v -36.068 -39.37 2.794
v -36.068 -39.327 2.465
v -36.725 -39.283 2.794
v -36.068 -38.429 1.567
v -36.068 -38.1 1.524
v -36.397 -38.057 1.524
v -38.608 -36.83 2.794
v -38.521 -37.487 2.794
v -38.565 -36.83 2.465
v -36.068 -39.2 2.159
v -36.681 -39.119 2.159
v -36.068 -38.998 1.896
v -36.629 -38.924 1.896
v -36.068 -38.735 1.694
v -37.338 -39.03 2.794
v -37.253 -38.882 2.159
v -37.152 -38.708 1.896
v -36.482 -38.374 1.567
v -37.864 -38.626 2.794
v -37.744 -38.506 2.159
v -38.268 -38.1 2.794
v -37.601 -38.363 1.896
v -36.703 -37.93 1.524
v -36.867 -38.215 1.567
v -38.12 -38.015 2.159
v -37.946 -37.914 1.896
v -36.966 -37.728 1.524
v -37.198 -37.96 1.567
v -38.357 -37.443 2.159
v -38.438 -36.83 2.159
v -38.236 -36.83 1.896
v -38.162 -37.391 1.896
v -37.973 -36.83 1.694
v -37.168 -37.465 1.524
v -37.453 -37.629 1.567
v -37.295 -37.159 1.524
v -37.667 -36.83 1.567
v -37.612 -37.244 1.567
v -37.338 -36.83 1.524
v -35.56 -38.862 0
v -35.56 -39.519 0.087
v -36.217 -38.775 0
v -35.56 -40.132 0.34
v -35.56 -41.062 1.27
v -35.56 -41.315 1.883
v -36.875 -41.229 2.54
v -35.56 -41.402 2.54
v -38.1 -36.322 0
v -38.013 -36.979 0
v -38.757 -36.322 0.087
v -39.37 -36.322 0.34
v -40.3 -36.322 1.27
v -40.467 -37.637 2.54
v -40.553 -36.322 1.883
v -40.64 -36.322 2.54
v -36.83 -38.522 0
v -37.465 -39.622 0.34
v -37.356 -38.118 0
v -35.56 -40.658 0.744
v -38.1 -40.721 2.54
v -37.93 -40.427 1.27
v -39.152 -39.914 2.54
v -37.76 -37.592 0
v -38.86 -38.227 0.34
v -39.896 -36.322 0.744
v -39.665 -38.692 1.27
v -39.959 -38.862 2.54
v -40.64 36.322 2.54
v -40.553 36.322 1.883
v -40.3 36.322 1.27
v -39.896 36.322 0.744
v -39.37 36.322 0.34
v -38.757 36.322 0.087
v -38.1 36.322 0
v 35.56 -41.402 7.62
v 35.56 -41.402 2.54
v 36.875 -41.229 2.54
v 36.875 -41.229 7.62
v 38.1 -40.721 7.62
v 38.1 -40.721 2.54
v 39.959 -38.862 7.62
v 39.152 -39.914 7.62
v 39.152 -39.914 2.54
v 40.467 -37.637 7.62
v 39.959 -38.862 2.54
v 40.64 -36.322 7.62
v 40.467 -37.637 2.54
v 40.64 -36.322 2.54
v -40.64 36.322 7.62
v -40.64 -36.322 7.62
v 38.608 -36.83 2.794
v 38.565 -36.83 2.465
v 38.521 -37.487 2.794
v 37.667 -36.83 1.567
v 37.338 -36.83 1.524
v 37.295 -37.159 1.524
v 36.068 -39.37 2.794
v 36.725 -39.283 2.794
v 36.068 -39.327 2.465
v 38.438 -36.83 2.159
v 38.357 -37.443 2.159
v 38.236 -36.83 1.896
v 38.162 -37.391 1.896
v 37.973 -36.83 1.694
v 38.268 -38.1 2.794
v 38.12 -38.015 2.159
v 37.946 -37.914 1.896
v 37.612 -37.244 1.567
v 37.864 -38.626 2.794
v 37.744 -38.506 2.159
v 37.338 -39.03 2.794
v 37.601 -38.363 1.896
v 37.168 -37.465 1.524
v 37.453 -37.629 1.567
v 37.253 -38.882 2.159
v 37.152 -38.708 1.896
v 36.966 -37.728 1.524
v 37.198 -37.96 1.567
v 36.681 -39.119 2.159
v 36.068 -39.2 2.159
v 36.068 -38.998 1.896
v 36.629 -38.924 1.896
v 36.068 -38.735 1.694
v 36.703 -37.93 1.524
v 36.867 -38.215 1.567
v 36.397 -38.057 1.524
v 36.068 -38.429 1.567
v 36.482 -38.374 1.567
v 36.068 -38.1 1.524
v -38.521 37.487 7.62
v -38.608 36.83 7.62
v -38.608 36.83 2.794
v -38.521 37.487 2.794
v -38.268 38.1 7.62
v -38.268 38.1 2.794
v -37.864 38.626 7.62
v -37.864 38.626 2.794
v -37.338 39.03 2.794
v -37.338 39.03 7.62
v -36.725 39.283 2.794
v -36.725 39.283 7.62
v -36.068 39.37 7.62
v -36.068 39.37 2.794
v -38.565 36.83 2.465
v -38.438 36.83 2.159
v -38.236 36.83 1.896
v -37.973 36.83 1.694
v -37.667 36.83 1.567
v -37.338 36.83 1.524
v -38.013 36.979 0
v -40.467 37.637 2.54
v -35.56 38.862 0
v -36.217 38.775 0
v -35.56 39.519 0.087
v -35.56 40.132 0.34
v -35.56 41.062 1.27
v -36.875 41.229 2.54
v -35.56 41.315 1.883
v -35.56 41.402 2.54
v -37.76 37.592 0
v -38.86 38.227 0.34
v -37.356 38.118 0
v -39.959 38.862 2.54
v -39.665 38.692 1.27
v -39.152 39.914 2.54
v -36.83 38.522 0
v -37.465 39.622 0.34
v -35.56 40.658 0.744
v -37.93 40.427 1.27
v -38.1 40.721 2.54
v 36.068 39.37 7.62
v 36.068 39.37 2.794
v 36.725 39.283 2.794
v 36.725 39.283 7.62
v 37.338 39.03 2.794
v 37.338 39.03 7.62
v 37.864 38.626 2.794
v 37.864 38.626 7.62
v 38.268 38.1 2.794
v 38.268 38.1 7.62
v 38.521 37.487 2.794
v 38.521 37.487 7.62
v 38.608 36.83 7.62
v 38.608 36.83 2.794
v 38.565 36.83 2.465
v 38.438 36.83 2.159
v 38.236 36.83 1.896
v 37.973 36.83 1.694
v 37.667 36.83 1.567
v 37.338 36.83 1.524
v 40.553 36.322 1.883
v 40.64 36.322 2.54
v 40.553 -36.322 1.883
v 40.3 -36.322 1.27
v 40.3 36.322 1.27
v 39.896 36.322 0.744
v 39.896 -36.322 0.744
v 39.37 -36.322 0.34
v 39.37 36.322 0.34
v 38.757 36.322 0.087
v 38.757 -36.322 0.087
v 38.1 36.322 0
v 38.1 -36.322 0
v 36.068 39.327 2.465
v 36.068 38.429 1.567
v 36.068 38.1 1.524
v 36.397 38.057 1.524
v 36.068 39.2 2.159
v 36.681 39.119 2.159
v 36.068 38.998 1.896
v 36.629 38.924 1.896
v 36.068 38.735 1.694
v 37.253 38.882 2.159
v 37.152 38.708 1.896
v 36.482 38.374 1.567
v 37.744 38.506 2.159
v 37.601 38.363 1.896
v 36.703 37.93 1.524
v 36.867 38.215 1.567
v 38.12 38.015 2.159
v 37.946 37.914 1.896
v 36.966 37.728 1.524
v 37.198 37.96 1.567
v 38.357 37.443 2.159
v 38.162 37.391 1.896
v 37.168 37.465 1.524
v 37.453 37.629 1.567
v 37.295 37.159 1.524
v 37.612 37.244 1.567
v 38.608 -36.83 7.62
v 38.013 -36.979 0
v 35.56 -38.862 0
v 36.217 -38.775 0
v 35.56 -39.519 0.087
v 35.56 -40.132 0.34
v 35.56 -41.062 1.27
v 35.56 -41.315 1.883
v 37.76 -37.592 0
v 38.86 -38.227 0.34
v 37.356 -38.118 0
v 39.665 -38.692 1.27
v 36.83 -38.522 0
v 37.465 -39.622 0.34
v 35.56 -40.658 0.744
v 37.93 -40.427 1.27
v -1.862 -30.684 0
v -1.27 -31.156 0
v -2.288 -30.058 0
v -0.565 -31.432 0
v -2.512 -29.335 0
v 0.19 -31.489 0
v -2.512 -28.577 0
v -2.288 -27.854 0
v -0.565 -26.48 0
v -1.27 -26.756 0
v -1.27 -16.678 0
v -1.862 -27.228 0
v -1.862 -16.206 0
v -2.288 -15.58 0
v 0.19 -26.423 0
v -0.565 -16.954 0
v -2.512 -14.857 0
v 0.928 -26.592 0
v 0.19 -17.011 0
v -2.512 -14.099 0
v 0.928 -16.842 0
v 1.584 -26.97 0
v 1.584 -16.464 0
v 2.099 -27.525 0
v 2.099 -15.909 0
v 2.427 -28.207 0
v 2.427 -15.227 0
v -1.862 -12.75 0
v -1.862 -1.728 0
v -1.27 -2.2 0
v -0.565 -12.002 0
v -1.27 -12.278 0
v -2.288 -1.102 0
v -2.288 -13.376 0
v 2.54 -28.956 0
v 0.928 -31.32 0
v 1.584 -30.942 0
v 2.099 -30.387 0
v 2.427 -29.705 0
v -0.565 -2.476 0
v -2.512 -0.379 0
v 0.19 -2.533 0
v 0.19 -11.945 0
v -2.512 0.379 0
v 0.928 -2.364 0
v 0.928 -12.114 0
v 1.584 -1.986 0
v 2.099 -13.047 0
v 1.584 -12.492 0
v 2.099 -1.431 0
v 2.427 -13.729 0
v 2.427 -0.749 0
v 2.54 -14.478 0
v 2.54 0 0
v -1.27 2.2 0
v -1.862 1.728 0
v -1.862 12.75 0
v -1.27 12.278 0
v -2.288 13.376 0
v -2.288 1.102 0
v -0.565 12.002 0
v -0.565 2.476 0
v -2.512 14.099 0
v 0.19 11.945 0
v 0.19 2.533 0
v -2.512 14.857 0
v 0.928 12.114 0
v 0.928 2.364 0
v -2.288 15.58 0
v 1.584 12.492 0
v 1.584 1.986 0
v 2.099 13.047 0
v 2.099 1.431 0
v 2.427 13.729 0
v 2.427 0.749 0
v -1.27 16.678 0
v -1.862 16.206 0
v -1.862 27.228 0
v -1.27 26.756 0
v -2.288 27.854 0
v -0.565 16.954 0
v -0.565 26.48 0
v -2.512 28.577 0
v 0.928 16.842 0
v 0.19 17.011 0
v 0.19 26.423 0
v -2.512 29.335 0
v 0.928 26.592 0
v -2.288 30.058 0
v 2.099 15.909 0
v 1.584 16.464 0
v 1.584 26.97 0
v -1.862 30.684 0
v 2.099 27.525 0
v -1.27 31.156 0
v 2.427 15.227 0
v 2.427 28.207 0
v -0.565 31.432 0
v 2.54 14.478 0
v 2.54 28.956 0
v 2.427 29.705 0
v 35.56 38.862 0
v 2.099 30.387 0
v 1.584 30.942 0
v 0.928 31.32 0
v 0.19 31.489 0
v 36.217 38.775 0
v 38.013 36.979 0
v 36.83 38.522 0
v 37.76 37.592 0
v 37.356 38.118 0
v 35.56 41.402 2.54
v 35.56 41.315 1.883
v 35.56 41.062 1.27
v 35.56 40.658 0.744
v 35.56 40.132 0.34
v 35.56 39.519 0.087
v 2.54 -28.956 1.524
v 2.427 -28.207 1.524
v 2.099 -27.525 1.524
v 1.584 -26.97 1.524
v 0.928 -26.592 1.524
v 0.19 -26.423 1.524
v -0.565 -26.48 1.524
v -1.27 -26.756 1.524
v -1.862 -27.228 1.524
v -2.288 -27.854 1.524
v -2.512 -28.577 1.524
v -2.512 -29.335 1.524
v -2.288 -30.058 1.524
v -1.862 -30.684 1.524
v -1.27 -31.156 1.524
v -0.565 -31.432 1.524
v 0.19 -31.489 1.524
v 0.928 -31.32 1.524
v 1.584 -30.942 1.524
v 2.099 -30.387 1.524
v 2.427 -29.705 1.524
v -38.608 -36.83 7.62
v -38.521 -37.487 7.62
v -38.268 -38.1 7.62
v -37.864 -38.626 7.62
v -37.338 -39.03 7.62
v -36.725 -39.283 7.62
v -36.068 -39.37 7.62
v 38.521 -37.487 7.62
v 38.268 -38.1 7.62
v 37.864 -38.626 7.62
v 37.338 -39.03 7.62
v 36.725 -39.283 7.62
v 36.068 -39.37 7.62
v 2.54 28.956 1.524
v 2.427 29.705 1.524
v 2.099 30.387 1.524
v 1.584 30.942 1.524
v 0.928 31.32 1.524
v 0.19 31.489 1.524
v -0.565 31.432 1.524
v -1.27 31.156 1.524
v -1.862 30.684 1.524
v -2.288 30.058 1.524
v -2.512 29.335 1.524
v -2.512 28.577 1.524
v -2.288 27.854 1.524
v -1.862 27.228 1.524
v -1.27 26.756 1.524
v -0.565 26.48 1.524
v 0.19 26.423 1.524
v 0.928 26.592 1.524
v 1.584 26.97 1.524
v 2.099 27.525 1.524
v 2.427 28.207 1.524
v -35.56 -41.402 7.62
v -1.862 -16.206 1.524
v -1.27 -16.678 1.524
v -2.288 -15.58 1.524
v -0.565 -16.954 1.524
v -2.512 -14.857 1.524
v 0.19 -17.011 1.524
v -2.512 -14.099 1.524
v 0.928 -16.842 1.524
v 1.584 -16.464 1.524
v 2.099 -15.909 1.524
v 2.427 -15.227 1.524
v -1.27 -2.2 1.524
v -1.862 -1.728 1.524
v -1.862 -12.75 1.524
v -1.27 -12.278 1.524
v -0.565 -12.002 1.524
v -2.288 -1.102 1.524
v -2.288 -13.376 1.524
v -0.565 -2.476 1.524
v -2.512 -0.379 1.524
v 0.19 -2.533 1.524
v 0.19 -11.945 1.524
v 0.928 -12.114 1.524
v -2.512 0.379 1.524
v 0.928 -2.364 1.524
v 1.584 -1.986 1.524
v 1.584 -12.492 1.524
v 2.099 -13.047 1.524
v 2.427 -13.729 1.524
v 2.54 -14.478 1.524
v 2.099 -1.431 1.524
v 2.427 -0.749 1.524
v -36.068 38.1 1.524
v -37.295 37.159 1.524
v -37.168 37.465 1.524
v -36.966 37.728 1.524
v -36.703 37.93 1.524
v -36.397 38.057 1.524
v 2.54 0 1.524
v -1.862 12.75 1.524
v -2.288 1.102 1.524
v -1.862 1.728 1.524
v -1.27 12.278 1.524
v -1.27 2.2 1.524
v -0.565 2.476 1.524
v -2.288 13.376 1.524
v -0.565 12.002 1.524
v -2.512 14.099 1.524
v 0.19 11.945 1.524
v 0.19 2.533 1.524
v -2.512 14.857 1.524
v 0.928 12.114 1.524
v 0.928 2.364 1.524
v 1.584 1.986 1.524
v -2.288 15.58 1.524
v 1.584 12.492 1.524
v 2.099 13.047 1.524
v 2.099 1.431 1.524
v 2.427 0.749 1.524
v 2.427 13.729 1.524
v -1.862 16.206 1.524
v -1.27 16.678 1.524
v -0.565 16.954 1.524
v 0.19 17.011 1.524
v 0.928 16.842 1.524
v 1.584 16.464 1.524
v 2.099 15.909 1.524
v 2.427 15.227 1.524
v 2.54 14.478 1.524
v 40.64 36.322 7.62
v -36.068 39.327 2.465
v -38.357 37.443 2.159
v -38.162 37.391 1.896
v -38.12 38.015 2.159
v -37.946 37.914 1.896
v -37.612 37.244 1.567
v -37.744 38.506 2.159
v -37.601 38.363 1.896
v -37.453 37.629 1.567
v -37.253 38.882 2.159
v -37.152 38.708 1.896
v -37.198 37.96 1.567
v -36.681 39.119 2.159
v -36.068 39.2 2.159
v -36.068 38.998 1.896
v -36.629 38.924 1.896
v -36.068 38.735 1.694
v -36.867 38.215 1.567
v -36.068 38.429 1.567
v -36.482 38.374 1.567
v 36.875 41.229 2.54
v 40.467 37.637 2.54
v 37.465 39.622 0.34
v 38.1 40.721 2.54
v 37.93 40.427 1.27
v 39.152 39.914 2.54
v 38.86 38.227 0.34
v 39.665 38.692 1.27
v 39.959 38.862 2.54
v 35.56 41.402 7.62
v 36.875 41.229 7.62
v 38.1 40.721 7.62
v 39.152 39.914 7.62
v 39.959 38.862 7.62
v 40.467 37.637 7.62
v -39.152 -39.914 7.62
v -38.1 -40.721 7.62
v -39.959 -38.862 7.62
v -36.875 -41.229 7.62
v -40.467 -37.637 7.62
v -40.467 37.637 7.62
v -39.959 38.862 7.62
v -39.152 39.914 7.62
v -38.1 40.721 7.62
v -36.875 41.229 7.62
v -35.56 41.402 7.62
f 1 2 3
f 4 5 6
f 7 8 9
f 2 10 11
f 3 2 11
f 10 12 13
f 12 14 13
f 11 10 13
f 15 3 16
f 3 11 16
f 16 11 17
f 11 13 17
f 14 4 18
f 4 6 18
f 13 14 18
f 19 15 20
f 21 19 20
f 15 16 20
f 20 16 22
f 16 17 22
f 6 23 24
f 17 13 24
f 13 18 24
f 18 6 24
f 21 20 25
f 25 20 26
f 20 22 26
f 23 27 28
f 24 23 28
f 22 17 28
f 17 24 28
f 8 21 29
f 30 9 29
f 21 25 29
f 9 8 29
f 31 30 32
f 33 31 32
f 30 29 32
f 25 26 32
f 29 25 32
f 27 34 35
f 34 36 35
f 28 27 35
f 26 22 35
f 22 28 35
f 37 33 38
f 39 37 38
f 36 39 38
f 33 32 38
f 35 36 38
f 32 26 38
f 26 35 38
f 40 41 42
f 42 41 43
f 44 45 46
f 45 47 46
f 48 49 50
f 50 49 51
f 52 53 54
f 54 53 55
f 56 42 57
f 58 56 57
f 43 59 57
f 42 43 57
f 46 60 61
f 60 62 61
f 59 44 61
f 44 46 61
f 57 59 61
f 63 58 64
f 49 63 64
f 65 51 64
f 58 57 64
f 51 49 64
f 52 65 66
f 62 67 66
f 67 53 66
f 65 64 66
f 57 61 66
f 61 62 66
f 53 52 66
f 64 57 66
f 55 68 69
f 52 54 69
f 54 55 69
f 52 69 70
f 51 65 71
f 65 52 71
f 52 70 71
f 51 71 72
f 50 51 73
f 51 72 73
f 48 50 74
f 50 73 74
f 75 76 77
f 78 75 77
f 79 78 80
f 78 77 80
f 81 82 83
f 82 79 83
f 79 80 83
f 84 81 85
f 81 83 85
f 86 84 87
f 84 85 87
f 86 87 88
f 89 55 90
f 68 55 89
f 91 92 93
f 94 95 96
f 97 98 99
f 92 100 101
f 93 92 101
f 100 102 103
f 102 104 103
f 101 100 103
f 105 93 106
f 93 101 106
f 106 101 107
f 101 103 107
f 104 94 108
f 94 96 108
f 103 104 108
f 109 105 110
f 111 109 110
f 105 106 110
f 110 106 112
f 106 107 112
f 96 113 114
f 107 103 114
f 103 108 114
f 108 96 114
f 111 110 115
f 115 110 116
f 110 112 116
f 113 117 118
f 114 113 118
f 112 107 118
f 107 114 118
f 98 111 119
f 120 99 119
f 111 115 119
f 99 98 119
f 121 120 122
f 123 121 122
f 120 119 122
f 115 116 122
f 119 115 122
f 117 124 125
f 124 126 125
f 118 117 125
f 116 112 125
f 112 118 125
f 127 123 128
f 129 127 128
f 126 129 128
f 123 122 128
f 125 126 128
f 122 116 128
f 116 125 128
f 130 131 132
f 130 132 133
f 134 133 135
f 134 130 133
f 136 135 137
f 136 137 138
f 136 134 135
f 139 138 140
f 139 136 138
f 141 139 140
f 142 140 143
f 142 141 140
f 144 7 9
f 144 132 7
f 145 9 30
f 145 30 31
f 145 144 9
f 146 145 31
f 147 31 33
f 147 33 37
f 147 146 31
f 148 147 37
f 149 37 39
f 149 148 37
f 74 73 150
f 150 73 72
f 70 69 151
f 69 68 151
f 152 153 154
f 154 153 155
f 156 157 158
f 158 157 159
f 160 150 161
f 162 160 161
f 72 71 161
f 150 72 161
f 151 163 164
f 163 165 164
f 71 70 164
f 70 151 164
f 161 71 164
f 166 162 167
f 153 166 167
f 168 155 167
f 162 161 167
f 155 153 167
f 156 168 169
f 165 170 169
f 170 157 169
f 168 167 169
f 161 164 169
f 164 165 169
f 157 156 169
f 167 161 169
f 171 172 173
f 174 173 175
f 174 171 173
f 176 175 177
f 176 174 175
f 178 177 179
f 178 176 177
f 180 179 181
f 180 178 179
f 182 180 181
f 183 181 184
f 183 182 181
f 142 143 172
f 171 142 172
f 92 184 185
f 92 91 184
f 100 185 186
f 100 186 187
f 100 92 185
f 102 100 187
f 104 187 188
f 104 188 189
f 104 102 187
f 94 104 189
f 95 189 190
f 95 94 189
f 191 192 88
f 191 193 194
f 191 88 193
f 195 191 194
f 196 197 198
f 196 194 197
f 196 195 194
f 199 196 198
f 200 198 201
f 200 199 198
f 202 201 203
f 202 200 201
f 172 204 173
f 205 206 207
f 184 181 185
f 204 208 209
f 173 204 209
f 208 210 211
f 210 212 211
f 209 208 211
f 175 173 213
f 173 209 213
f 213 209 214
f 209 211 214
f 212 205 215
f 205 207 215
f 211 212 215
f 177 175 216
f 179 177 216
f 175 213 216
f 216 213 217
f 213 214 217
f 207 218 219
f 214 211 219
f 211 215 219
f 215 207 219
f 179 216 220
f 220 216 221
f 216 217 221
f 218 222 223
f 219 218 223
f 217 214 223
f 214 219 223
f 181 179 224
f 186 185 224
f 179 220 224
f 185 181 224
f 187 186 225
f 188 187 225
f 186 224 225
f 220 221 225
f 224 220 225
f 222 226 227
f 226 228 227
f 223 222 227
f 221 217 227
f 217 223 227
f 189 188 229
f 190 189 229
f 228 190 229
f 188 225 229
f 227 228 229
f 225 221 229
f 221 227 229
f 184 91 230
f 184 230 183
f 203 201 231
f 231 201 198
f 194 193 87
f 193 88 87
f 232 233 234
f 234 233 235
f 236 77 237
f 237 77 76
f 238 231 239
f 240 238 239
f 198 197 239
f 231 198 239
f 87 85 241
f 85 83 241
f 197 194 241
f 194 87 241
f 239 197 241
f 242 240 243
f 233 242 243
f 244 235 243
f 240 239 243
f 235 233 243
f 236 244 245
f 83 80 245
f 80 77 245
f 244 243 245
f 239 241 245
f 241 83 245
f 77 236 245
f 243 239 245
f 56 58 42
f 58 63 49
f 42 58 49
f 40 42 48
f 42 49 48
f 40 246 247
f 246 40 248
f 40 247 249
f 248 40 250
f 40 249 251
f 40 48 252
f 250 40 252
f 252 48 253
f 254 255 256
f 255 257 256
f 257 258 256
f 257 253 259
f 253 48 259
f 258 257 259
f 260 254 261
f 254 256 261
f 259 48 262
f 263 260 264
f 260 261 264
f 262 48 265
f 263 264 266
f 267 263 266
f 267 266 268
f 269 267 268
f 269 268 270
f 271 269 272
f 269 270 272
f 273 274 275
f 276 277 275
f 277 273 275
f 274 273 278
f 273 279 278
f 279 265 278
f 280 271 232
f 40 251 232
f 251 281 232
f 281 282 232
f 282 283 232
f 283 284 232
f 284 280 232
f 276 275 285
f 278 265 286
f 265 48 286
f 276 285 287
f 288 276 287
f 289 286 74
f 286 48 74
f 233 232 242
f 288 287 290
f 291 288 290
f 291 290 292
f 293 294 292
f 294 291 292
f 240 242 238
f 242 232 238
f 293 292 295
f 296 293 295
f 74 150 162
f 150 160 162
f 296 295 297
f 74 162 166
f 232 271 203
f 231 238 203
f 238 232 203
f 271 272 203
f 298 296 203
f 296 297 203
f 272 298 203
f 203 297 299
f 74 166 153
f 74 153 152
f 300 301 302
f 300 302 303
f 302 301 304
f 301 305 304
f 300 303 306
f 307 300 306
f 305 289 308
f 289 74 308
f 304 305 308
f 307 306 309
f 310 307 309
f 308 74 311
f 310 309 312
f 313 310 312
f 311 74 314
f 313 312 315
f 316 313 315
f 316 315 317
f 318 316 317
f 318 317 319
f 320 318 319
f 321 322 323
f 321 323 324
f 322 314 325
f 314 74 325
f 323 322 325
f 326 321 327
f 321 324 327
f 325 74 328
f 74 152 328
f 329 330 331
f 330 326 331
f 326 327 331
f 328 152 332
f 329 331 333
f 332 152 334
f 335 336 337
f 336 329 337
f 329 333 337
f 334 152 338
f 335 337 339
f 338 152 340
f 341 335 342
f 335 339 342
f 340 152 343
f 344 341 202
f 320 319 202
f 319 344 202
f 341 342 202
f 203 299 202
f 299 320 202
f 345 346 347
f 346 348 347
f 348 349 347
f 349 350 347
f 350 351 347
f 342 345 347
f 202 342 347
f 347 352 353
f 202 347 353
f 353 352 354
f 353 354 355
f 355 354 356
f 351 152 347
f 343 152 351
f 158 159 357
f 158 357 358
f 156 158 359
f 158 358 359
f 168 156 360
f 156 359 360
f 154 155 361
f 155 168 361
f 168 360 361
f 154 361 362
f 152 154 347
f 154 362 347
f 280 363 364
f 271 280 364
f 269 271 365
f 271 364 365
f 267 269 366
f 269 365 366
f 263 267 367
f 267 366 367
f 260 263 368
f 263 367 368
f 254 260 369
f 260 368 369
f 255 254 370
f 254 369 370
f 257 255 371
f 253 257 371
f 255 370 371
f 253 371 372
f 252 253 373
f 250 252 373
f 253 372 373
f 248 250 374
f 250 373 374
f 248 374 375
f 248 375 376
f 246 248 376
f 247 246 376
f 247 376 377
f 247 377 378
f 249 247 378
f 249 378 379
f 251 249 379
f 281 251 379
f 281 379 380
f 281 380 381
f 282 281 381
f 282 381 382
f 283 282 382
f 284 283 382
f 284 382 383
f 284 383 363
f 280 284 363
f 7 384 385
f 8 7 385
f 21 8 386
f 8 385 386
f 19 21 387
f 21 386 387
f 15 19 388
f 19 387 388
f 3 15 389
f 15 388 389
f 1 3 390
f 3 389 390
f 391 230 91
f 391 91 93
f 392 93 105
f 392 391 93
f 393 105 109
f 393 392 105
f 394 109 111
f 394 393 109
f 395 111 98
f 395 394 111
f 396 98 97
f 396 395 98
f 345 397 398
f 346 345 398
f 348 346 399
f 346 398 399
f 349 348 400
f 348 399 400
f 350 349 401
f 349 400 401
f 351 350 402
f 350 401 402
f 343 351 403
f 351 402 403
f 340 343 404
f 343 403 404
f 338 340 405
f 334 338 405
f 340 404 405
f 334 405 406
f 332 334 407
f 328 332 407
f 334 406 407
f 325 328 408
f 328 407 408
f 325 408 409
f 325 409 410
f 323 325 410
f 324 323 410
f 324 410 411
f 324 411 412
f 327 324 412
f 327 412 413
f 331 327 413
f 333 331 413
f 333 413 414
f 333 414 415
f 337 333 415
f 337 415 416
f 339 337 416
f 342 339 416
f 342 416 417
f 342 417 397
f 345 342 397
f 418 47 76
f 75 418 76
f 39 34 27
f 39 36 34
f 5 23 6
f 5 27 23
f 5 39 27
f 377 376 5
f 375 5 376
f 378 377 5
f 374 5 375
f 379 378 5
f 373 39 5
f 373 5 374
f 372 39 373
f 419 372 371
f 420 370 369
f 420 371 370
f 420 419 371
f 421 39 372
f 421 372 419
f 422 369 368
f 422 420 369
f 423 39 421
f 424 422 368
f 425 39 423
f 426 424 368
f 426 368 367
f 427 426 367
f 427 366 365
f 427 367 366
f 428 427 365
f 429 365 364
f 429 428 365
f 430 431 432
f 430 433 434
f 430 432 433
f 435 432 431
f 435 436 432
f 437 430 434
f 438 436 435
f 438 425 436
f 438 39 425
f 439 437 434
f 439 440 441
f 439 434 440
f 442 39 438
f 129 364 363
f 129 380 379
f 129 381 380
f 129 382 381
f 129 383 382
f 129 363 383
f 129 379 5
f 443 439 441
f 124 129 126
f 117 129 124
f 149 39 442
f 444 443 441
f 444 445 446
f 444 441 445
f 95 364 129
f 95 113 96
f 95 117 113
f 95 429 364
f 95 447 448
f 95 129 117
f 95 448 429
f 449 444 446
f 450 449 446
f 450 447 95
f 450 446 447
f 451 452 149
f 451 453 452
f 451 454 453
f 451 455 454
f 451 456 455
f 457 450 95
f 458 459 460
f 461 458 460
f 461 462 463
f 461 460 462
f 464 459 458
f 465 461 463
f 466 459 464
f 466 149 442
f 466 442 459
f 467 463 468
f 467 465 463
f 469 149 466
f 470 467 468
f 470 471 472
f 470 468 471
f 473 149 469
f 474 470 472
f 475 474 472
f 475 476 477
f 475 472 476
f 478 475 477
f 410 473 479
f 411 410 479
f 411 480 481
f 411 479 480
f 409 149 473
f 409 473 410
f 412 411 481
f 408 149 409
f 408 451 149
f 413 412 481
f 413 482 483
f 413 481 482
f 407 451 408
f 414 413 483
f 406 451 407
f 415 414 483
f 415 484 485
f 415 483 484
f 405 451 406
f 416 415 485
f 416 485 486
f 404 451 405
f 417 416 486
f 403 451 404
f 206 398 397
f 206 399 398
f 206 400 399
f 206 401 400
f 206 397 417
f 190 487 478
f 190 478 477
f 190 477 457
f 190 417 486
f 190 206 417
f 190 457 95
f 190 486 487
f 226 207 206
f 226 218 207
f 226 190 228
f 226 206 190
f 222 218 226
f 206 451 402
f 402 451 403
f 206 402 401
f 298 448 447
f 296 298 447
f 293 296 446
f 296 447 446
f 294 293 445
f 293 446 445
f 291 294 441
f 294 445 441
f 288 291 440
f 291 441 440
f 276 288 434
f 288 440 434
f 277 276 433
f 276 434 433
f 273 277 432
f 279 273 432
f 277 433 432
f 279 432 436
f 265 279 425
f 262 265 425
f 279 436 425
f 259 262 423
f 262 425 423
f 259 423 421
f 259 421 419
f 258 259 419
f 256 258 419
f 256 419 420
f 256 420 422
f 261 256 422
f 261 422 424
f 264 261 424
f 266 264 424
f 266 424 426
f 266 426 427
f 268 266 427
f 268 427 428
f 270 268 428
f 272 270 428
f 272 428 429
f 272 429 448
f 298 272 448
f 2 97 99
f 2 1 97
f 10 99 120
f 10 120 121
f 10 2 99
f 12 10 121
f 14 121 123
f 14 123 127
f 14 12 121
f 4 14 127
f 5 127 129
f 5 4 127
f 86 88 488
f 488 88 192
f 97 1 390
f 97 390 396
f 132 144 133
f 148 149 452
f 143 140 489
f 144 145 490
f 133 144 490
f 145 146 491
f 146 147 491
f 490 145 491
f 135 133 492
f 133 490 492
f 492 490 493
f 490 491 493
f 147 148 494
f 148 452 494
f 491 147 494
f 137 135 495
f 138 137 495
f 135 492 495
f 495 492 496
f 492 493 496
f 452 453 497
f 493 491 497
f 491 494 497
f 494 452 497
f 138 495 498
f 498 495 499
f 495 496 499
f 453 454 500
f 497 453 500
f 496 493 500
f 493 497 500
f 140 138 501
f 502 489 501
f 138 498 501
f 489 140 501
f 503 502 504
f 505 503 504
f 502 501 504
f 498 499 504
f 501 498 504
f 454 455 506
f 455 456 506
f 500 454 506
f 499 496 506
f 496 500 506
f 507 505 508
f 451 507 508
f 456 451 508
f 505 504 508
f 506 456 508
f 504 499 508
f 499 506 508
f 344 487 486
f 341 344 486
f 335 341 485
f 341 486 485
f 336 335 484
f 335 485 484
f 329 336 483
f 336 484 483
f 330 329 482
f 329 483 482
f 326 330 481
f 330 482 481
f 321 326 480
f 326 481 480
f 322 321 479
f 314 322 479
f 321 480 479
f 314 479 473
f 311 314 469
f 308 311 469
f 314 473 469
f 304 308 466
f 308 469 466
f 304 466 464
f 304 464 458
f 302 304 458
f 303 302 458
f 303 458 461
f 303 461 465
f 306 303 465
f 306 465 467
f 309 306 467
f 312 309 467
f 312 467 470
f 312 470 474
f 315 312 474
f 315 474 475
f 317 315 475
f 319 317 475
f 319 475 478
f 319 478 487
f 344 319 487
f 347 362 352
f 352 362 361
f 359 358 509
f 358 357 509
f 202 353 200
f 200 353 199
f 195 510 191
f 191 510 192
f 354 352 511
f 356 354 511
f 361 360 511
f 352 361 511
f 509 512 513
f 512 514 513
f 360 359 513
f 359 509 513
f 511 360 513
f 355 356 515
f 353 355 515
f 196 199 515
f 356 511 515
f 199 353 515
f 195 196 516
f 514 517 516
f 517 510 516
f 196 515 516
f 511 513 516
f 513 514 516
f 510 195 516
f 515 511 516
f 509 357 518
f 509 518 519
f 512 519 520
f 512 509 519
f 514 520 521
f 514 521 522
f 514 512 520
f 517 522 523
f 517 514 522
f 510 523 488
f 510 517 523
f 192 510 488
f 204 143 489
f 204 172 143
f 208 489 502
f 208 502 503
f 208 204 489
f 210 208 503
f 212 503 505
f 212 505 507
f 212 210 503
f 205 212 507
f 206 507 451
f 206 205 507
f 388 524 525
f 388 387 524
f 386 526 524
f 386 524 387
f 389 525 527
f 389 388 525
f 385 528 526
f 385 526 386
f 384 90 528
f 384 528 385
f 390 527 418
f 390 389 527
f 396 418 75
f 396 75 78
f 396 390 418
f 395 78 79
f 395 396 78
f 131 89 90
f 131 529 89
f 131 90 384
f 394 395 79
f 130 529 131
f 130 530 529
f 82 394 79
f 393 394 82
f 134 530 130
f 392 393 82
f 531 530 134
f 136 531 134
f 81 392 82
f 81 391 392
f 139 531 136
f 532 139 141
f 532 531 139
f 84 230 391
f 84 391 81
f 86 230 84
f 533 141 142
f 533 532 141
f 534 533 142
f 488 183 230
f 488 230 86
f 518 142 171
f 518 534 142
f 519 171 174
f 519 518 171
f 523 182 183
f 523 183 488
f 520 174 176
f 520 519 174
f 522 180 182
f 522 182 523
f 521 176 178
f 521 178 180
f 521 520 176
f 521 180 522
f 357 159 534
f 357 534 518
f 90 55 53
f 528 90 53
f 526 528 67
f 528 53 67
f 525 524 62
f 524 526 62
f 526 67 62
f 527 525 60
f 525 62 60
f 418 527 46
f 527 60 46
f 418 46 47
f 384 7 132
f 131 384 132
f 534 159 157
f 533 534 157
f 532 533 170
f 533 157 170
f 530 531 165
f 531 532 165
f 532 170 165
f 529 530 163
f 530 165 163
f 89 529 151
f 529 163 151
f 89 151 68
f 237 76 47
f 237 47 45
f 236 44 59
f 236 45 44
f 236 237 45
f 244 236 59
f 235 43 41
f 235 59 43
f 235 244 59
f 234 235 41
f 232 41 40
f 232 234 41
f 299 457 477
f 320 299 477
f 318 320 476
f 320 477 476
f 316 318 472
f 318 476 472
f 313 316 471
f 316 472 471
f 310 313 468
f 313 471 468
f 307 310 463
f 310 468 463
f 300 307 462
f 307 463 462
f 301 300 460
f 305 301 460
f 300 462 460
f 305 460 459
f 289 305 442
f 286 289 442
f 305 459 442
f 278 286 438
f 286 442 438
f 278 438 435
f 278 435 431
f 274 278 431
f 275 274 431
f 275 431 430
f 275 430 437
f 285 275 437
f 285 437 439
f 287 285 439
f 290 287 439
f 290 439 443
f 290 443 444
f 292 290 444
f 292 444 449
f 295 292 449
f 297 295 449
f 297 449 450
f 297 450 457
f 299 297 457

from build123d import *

# Parameters (mm, degrees)
F0_W         = 81.28
F0_H         = 82.804
F0_W_2       = 77.216
F0_H_2       = 78.74
F1_DEPTH     = 7.62
F2_DEPTH     = 1.524
F3_R         = 2.54
F4_R         = 1.27
F5_R         = 2.54
F6_DEPTH     = 25.4
F7_T1_DEPTH  = 20.32
F7_T4_ANGLE  = 90
F7_T6_ANGLE  = 90
F7_T8_ANGLE  = 90
F7_T10_ANGLE = 90


# Not quite as in the source:
# - a fillet or chamfer that OpenCascade refuses, or shapes differently, is made with other operations: its cross-section is extruded or revolved along the edge and cut away or added


with BuildPart() as f1:
    # F0 (on Top) → F1 (new body)
    with BuildSketch(Plane.XY):
        Rectangle(F0_W, F0_H)
        Rectangle(F0_W_2, F0_H_2, mode=Mode.SUBTRACT)
    extrude(amount=F1_DEPTH)

    # F0 (on Top) → F2 (join)
    with BuildSketch(Plane.XY):
        Rectangle(F0_W, F0_H)
        Rectangle(F0_W_2, F0_H_2, mode=Mode.SUBTRACT)
        Rectangle(F0_W_2, F0_H_2)
    extrude(amount=F2_DEPTH)

    # F3
    f3_edges = [f1.edges().sort_by_distance(p)[0] for p in [
        (-38.608, 39.37, 4.572),
        (38.608, 39.37, 4.572),
        (38.608, -39.37, 4.572),
        (-38.608, -39.37, 4.572),
        (0, 41.402, 0),
        (-40.64, 0, 0),
        (0, -41.402, 0),
        (40.64, 0, 0),
    ]]
    fillet(f3_edges, radius=F3_R)

    # F4
    f4_edges = [f1.edges().sort_by_distance(p)[0] for p in [
        (-38.608, 0, 1.524),
        (-37.864051, -38.626051, 1.524),
        (-37.864051, 38.626051, 1.524),
        (0, -39.37, 1.524),
        (0, 39.37, 1.524),
        (37.864051, -38.626051, 1.524),
        (37.864051, 38.626051, 1.524),
        (38.608, 0, 1.524),
    ]]
    fillet(f4_edges, radius=F4_R)

    # F5 (on face) → F6 (cut)
    with BuildSketch(Plane.XY.offset(1.524)):
        with Locations((0, 28.956)):
            Circle(F5_R)
        with Locations((0, 14.478)):
            Circle(F5_R)
        Circle(F5_R)
        with Locations((0, -14.478)):
            Circle(F5_R)
        with Locations((0, -28.956)):
            Circle(F5_R)
    extrude(amount=-F6_DEPTH, mode=Mode.SUBTRACT)

    # F7: fillet of radius 5.08 on 4 edges, made by hand

    # F7_s2 → F7_t1 (cut)
    with BuildSketch(Plane.XY):
        with BuildLine():
            ThreePointArc((35.56, -41.402), (39.1521024484, -39.9141024484), (40.64, -36.322))
            Line((40.64, -36.322), (40.64, -41.402))
            Line((40.64, -41.402), (35.56, -41.402))
        make_face()
        with BuildLine():
            ThreePointArc((35.56, 41.402), (39.1521024484, 39.9141024484), (40.64, 36.322))
            Line((40.64, 36.322), (40.64, 41.402))
            Line((40.64, 41.402), (35.56, 41.402))
        make_face()
        with BuildLine():
            ThreePointArc((-35.56, 41.402), (-39.1521024484, 39.9141024484), (-40.64, 36.322))
            Line((-40.64, 36.322), (-40.64, 41.402))
            Line((-40.64, 41.402), (-35.56, 41.402))
        make_face()
        with BuildLine():
            ThreePointArc((-40.64, -36.322), (-39.1521024484, -39.9141024484), (-35.56, -41.402))
            Line((-35.56, -41.402), (-40.64, -41.402))
            Line((-40.64, -41.402), (-40.64, -36.322))
        make_face()
    extrude(amount=F7_T1_DEPTH, mode=Mode.SUBTRACT)

    # F7_s3 → F7_t4 (revolve, cut)
    with BuildSketch(Plane.YZ.offset(-35.56)):
        with BuildLine():
            ThreePointArc((-38.862, 0), (-40.6580512242, 0.7439487758), (-41.402, 2.54))
            Line((-41.402, 2.54), (-41.402, 0))
            Line((-41.402, 0), (-38.862, 0))
        make_face()
    revolve(axis=Axis((-35.56, -36.322, 0), (0, 0, -1)), revolution_arc=F7_T4_ANGLE, mode=Mode.SUBTRACT)

    # F7_s5 → F7_t6 (revolve, cut)
    with BuildSketch(Plane.XZ.offset(-36.322)):
        with BuildLine():
            ThreePointArc((-38.1, 0), (-39.8960512242, 0.7439487758), (-40.64, 2.54))
            Line((-40.64, 2.54), (-40.64, 0))
            Line((-40.64, 0), (-38.1, 0))
        make_face()
    revolve(axis=Axis((-35.56, 36.322, 0), (0, 0, -1)), revolution_arc=F7_T6_ANGLE, mode=Mode.SUBTRACT)

    # F7_s7 → F7_t8 (revolve, cut)
    with BuildSketch(Plane.YZ.offset(35.56)):
        with BuildLine():
            ThreePointArc((38.862, 0), (40.6580512242, 0.7439487758), (41.402, 2.54))
            Line((41.402, 2.54), (41.402, 0))
            Line((41.402, 0), (38.862, 0))
        make_face()
    revolve(axis=Axis((35.56, 36.322, 0), (0, 0, -1)), revolution_arc=F7_T8_ANGLE, mode=Mode.SUBTRACT)

    # F7_s9 → F7_t10 (revolve, cut)
    with BuildSketch(Plane.XZ.offset(36.322)):
        with BuildLine():
            ThreePointArc((38.1, 0), (39.8960512242, 0.7439487758), (40.64, 2.54))
            Line((40.64, 2.54), (40.64, 0))
            Line((40.64, 0), (38.1, 0))
        make_face()
    revolve(axis=Axis((35.56, -36.322, 0), (0, 0, -1)), revolution_arc=F7_T10_ANGLE, mode=Mode.SUBTRACT)


solid = f1.part
